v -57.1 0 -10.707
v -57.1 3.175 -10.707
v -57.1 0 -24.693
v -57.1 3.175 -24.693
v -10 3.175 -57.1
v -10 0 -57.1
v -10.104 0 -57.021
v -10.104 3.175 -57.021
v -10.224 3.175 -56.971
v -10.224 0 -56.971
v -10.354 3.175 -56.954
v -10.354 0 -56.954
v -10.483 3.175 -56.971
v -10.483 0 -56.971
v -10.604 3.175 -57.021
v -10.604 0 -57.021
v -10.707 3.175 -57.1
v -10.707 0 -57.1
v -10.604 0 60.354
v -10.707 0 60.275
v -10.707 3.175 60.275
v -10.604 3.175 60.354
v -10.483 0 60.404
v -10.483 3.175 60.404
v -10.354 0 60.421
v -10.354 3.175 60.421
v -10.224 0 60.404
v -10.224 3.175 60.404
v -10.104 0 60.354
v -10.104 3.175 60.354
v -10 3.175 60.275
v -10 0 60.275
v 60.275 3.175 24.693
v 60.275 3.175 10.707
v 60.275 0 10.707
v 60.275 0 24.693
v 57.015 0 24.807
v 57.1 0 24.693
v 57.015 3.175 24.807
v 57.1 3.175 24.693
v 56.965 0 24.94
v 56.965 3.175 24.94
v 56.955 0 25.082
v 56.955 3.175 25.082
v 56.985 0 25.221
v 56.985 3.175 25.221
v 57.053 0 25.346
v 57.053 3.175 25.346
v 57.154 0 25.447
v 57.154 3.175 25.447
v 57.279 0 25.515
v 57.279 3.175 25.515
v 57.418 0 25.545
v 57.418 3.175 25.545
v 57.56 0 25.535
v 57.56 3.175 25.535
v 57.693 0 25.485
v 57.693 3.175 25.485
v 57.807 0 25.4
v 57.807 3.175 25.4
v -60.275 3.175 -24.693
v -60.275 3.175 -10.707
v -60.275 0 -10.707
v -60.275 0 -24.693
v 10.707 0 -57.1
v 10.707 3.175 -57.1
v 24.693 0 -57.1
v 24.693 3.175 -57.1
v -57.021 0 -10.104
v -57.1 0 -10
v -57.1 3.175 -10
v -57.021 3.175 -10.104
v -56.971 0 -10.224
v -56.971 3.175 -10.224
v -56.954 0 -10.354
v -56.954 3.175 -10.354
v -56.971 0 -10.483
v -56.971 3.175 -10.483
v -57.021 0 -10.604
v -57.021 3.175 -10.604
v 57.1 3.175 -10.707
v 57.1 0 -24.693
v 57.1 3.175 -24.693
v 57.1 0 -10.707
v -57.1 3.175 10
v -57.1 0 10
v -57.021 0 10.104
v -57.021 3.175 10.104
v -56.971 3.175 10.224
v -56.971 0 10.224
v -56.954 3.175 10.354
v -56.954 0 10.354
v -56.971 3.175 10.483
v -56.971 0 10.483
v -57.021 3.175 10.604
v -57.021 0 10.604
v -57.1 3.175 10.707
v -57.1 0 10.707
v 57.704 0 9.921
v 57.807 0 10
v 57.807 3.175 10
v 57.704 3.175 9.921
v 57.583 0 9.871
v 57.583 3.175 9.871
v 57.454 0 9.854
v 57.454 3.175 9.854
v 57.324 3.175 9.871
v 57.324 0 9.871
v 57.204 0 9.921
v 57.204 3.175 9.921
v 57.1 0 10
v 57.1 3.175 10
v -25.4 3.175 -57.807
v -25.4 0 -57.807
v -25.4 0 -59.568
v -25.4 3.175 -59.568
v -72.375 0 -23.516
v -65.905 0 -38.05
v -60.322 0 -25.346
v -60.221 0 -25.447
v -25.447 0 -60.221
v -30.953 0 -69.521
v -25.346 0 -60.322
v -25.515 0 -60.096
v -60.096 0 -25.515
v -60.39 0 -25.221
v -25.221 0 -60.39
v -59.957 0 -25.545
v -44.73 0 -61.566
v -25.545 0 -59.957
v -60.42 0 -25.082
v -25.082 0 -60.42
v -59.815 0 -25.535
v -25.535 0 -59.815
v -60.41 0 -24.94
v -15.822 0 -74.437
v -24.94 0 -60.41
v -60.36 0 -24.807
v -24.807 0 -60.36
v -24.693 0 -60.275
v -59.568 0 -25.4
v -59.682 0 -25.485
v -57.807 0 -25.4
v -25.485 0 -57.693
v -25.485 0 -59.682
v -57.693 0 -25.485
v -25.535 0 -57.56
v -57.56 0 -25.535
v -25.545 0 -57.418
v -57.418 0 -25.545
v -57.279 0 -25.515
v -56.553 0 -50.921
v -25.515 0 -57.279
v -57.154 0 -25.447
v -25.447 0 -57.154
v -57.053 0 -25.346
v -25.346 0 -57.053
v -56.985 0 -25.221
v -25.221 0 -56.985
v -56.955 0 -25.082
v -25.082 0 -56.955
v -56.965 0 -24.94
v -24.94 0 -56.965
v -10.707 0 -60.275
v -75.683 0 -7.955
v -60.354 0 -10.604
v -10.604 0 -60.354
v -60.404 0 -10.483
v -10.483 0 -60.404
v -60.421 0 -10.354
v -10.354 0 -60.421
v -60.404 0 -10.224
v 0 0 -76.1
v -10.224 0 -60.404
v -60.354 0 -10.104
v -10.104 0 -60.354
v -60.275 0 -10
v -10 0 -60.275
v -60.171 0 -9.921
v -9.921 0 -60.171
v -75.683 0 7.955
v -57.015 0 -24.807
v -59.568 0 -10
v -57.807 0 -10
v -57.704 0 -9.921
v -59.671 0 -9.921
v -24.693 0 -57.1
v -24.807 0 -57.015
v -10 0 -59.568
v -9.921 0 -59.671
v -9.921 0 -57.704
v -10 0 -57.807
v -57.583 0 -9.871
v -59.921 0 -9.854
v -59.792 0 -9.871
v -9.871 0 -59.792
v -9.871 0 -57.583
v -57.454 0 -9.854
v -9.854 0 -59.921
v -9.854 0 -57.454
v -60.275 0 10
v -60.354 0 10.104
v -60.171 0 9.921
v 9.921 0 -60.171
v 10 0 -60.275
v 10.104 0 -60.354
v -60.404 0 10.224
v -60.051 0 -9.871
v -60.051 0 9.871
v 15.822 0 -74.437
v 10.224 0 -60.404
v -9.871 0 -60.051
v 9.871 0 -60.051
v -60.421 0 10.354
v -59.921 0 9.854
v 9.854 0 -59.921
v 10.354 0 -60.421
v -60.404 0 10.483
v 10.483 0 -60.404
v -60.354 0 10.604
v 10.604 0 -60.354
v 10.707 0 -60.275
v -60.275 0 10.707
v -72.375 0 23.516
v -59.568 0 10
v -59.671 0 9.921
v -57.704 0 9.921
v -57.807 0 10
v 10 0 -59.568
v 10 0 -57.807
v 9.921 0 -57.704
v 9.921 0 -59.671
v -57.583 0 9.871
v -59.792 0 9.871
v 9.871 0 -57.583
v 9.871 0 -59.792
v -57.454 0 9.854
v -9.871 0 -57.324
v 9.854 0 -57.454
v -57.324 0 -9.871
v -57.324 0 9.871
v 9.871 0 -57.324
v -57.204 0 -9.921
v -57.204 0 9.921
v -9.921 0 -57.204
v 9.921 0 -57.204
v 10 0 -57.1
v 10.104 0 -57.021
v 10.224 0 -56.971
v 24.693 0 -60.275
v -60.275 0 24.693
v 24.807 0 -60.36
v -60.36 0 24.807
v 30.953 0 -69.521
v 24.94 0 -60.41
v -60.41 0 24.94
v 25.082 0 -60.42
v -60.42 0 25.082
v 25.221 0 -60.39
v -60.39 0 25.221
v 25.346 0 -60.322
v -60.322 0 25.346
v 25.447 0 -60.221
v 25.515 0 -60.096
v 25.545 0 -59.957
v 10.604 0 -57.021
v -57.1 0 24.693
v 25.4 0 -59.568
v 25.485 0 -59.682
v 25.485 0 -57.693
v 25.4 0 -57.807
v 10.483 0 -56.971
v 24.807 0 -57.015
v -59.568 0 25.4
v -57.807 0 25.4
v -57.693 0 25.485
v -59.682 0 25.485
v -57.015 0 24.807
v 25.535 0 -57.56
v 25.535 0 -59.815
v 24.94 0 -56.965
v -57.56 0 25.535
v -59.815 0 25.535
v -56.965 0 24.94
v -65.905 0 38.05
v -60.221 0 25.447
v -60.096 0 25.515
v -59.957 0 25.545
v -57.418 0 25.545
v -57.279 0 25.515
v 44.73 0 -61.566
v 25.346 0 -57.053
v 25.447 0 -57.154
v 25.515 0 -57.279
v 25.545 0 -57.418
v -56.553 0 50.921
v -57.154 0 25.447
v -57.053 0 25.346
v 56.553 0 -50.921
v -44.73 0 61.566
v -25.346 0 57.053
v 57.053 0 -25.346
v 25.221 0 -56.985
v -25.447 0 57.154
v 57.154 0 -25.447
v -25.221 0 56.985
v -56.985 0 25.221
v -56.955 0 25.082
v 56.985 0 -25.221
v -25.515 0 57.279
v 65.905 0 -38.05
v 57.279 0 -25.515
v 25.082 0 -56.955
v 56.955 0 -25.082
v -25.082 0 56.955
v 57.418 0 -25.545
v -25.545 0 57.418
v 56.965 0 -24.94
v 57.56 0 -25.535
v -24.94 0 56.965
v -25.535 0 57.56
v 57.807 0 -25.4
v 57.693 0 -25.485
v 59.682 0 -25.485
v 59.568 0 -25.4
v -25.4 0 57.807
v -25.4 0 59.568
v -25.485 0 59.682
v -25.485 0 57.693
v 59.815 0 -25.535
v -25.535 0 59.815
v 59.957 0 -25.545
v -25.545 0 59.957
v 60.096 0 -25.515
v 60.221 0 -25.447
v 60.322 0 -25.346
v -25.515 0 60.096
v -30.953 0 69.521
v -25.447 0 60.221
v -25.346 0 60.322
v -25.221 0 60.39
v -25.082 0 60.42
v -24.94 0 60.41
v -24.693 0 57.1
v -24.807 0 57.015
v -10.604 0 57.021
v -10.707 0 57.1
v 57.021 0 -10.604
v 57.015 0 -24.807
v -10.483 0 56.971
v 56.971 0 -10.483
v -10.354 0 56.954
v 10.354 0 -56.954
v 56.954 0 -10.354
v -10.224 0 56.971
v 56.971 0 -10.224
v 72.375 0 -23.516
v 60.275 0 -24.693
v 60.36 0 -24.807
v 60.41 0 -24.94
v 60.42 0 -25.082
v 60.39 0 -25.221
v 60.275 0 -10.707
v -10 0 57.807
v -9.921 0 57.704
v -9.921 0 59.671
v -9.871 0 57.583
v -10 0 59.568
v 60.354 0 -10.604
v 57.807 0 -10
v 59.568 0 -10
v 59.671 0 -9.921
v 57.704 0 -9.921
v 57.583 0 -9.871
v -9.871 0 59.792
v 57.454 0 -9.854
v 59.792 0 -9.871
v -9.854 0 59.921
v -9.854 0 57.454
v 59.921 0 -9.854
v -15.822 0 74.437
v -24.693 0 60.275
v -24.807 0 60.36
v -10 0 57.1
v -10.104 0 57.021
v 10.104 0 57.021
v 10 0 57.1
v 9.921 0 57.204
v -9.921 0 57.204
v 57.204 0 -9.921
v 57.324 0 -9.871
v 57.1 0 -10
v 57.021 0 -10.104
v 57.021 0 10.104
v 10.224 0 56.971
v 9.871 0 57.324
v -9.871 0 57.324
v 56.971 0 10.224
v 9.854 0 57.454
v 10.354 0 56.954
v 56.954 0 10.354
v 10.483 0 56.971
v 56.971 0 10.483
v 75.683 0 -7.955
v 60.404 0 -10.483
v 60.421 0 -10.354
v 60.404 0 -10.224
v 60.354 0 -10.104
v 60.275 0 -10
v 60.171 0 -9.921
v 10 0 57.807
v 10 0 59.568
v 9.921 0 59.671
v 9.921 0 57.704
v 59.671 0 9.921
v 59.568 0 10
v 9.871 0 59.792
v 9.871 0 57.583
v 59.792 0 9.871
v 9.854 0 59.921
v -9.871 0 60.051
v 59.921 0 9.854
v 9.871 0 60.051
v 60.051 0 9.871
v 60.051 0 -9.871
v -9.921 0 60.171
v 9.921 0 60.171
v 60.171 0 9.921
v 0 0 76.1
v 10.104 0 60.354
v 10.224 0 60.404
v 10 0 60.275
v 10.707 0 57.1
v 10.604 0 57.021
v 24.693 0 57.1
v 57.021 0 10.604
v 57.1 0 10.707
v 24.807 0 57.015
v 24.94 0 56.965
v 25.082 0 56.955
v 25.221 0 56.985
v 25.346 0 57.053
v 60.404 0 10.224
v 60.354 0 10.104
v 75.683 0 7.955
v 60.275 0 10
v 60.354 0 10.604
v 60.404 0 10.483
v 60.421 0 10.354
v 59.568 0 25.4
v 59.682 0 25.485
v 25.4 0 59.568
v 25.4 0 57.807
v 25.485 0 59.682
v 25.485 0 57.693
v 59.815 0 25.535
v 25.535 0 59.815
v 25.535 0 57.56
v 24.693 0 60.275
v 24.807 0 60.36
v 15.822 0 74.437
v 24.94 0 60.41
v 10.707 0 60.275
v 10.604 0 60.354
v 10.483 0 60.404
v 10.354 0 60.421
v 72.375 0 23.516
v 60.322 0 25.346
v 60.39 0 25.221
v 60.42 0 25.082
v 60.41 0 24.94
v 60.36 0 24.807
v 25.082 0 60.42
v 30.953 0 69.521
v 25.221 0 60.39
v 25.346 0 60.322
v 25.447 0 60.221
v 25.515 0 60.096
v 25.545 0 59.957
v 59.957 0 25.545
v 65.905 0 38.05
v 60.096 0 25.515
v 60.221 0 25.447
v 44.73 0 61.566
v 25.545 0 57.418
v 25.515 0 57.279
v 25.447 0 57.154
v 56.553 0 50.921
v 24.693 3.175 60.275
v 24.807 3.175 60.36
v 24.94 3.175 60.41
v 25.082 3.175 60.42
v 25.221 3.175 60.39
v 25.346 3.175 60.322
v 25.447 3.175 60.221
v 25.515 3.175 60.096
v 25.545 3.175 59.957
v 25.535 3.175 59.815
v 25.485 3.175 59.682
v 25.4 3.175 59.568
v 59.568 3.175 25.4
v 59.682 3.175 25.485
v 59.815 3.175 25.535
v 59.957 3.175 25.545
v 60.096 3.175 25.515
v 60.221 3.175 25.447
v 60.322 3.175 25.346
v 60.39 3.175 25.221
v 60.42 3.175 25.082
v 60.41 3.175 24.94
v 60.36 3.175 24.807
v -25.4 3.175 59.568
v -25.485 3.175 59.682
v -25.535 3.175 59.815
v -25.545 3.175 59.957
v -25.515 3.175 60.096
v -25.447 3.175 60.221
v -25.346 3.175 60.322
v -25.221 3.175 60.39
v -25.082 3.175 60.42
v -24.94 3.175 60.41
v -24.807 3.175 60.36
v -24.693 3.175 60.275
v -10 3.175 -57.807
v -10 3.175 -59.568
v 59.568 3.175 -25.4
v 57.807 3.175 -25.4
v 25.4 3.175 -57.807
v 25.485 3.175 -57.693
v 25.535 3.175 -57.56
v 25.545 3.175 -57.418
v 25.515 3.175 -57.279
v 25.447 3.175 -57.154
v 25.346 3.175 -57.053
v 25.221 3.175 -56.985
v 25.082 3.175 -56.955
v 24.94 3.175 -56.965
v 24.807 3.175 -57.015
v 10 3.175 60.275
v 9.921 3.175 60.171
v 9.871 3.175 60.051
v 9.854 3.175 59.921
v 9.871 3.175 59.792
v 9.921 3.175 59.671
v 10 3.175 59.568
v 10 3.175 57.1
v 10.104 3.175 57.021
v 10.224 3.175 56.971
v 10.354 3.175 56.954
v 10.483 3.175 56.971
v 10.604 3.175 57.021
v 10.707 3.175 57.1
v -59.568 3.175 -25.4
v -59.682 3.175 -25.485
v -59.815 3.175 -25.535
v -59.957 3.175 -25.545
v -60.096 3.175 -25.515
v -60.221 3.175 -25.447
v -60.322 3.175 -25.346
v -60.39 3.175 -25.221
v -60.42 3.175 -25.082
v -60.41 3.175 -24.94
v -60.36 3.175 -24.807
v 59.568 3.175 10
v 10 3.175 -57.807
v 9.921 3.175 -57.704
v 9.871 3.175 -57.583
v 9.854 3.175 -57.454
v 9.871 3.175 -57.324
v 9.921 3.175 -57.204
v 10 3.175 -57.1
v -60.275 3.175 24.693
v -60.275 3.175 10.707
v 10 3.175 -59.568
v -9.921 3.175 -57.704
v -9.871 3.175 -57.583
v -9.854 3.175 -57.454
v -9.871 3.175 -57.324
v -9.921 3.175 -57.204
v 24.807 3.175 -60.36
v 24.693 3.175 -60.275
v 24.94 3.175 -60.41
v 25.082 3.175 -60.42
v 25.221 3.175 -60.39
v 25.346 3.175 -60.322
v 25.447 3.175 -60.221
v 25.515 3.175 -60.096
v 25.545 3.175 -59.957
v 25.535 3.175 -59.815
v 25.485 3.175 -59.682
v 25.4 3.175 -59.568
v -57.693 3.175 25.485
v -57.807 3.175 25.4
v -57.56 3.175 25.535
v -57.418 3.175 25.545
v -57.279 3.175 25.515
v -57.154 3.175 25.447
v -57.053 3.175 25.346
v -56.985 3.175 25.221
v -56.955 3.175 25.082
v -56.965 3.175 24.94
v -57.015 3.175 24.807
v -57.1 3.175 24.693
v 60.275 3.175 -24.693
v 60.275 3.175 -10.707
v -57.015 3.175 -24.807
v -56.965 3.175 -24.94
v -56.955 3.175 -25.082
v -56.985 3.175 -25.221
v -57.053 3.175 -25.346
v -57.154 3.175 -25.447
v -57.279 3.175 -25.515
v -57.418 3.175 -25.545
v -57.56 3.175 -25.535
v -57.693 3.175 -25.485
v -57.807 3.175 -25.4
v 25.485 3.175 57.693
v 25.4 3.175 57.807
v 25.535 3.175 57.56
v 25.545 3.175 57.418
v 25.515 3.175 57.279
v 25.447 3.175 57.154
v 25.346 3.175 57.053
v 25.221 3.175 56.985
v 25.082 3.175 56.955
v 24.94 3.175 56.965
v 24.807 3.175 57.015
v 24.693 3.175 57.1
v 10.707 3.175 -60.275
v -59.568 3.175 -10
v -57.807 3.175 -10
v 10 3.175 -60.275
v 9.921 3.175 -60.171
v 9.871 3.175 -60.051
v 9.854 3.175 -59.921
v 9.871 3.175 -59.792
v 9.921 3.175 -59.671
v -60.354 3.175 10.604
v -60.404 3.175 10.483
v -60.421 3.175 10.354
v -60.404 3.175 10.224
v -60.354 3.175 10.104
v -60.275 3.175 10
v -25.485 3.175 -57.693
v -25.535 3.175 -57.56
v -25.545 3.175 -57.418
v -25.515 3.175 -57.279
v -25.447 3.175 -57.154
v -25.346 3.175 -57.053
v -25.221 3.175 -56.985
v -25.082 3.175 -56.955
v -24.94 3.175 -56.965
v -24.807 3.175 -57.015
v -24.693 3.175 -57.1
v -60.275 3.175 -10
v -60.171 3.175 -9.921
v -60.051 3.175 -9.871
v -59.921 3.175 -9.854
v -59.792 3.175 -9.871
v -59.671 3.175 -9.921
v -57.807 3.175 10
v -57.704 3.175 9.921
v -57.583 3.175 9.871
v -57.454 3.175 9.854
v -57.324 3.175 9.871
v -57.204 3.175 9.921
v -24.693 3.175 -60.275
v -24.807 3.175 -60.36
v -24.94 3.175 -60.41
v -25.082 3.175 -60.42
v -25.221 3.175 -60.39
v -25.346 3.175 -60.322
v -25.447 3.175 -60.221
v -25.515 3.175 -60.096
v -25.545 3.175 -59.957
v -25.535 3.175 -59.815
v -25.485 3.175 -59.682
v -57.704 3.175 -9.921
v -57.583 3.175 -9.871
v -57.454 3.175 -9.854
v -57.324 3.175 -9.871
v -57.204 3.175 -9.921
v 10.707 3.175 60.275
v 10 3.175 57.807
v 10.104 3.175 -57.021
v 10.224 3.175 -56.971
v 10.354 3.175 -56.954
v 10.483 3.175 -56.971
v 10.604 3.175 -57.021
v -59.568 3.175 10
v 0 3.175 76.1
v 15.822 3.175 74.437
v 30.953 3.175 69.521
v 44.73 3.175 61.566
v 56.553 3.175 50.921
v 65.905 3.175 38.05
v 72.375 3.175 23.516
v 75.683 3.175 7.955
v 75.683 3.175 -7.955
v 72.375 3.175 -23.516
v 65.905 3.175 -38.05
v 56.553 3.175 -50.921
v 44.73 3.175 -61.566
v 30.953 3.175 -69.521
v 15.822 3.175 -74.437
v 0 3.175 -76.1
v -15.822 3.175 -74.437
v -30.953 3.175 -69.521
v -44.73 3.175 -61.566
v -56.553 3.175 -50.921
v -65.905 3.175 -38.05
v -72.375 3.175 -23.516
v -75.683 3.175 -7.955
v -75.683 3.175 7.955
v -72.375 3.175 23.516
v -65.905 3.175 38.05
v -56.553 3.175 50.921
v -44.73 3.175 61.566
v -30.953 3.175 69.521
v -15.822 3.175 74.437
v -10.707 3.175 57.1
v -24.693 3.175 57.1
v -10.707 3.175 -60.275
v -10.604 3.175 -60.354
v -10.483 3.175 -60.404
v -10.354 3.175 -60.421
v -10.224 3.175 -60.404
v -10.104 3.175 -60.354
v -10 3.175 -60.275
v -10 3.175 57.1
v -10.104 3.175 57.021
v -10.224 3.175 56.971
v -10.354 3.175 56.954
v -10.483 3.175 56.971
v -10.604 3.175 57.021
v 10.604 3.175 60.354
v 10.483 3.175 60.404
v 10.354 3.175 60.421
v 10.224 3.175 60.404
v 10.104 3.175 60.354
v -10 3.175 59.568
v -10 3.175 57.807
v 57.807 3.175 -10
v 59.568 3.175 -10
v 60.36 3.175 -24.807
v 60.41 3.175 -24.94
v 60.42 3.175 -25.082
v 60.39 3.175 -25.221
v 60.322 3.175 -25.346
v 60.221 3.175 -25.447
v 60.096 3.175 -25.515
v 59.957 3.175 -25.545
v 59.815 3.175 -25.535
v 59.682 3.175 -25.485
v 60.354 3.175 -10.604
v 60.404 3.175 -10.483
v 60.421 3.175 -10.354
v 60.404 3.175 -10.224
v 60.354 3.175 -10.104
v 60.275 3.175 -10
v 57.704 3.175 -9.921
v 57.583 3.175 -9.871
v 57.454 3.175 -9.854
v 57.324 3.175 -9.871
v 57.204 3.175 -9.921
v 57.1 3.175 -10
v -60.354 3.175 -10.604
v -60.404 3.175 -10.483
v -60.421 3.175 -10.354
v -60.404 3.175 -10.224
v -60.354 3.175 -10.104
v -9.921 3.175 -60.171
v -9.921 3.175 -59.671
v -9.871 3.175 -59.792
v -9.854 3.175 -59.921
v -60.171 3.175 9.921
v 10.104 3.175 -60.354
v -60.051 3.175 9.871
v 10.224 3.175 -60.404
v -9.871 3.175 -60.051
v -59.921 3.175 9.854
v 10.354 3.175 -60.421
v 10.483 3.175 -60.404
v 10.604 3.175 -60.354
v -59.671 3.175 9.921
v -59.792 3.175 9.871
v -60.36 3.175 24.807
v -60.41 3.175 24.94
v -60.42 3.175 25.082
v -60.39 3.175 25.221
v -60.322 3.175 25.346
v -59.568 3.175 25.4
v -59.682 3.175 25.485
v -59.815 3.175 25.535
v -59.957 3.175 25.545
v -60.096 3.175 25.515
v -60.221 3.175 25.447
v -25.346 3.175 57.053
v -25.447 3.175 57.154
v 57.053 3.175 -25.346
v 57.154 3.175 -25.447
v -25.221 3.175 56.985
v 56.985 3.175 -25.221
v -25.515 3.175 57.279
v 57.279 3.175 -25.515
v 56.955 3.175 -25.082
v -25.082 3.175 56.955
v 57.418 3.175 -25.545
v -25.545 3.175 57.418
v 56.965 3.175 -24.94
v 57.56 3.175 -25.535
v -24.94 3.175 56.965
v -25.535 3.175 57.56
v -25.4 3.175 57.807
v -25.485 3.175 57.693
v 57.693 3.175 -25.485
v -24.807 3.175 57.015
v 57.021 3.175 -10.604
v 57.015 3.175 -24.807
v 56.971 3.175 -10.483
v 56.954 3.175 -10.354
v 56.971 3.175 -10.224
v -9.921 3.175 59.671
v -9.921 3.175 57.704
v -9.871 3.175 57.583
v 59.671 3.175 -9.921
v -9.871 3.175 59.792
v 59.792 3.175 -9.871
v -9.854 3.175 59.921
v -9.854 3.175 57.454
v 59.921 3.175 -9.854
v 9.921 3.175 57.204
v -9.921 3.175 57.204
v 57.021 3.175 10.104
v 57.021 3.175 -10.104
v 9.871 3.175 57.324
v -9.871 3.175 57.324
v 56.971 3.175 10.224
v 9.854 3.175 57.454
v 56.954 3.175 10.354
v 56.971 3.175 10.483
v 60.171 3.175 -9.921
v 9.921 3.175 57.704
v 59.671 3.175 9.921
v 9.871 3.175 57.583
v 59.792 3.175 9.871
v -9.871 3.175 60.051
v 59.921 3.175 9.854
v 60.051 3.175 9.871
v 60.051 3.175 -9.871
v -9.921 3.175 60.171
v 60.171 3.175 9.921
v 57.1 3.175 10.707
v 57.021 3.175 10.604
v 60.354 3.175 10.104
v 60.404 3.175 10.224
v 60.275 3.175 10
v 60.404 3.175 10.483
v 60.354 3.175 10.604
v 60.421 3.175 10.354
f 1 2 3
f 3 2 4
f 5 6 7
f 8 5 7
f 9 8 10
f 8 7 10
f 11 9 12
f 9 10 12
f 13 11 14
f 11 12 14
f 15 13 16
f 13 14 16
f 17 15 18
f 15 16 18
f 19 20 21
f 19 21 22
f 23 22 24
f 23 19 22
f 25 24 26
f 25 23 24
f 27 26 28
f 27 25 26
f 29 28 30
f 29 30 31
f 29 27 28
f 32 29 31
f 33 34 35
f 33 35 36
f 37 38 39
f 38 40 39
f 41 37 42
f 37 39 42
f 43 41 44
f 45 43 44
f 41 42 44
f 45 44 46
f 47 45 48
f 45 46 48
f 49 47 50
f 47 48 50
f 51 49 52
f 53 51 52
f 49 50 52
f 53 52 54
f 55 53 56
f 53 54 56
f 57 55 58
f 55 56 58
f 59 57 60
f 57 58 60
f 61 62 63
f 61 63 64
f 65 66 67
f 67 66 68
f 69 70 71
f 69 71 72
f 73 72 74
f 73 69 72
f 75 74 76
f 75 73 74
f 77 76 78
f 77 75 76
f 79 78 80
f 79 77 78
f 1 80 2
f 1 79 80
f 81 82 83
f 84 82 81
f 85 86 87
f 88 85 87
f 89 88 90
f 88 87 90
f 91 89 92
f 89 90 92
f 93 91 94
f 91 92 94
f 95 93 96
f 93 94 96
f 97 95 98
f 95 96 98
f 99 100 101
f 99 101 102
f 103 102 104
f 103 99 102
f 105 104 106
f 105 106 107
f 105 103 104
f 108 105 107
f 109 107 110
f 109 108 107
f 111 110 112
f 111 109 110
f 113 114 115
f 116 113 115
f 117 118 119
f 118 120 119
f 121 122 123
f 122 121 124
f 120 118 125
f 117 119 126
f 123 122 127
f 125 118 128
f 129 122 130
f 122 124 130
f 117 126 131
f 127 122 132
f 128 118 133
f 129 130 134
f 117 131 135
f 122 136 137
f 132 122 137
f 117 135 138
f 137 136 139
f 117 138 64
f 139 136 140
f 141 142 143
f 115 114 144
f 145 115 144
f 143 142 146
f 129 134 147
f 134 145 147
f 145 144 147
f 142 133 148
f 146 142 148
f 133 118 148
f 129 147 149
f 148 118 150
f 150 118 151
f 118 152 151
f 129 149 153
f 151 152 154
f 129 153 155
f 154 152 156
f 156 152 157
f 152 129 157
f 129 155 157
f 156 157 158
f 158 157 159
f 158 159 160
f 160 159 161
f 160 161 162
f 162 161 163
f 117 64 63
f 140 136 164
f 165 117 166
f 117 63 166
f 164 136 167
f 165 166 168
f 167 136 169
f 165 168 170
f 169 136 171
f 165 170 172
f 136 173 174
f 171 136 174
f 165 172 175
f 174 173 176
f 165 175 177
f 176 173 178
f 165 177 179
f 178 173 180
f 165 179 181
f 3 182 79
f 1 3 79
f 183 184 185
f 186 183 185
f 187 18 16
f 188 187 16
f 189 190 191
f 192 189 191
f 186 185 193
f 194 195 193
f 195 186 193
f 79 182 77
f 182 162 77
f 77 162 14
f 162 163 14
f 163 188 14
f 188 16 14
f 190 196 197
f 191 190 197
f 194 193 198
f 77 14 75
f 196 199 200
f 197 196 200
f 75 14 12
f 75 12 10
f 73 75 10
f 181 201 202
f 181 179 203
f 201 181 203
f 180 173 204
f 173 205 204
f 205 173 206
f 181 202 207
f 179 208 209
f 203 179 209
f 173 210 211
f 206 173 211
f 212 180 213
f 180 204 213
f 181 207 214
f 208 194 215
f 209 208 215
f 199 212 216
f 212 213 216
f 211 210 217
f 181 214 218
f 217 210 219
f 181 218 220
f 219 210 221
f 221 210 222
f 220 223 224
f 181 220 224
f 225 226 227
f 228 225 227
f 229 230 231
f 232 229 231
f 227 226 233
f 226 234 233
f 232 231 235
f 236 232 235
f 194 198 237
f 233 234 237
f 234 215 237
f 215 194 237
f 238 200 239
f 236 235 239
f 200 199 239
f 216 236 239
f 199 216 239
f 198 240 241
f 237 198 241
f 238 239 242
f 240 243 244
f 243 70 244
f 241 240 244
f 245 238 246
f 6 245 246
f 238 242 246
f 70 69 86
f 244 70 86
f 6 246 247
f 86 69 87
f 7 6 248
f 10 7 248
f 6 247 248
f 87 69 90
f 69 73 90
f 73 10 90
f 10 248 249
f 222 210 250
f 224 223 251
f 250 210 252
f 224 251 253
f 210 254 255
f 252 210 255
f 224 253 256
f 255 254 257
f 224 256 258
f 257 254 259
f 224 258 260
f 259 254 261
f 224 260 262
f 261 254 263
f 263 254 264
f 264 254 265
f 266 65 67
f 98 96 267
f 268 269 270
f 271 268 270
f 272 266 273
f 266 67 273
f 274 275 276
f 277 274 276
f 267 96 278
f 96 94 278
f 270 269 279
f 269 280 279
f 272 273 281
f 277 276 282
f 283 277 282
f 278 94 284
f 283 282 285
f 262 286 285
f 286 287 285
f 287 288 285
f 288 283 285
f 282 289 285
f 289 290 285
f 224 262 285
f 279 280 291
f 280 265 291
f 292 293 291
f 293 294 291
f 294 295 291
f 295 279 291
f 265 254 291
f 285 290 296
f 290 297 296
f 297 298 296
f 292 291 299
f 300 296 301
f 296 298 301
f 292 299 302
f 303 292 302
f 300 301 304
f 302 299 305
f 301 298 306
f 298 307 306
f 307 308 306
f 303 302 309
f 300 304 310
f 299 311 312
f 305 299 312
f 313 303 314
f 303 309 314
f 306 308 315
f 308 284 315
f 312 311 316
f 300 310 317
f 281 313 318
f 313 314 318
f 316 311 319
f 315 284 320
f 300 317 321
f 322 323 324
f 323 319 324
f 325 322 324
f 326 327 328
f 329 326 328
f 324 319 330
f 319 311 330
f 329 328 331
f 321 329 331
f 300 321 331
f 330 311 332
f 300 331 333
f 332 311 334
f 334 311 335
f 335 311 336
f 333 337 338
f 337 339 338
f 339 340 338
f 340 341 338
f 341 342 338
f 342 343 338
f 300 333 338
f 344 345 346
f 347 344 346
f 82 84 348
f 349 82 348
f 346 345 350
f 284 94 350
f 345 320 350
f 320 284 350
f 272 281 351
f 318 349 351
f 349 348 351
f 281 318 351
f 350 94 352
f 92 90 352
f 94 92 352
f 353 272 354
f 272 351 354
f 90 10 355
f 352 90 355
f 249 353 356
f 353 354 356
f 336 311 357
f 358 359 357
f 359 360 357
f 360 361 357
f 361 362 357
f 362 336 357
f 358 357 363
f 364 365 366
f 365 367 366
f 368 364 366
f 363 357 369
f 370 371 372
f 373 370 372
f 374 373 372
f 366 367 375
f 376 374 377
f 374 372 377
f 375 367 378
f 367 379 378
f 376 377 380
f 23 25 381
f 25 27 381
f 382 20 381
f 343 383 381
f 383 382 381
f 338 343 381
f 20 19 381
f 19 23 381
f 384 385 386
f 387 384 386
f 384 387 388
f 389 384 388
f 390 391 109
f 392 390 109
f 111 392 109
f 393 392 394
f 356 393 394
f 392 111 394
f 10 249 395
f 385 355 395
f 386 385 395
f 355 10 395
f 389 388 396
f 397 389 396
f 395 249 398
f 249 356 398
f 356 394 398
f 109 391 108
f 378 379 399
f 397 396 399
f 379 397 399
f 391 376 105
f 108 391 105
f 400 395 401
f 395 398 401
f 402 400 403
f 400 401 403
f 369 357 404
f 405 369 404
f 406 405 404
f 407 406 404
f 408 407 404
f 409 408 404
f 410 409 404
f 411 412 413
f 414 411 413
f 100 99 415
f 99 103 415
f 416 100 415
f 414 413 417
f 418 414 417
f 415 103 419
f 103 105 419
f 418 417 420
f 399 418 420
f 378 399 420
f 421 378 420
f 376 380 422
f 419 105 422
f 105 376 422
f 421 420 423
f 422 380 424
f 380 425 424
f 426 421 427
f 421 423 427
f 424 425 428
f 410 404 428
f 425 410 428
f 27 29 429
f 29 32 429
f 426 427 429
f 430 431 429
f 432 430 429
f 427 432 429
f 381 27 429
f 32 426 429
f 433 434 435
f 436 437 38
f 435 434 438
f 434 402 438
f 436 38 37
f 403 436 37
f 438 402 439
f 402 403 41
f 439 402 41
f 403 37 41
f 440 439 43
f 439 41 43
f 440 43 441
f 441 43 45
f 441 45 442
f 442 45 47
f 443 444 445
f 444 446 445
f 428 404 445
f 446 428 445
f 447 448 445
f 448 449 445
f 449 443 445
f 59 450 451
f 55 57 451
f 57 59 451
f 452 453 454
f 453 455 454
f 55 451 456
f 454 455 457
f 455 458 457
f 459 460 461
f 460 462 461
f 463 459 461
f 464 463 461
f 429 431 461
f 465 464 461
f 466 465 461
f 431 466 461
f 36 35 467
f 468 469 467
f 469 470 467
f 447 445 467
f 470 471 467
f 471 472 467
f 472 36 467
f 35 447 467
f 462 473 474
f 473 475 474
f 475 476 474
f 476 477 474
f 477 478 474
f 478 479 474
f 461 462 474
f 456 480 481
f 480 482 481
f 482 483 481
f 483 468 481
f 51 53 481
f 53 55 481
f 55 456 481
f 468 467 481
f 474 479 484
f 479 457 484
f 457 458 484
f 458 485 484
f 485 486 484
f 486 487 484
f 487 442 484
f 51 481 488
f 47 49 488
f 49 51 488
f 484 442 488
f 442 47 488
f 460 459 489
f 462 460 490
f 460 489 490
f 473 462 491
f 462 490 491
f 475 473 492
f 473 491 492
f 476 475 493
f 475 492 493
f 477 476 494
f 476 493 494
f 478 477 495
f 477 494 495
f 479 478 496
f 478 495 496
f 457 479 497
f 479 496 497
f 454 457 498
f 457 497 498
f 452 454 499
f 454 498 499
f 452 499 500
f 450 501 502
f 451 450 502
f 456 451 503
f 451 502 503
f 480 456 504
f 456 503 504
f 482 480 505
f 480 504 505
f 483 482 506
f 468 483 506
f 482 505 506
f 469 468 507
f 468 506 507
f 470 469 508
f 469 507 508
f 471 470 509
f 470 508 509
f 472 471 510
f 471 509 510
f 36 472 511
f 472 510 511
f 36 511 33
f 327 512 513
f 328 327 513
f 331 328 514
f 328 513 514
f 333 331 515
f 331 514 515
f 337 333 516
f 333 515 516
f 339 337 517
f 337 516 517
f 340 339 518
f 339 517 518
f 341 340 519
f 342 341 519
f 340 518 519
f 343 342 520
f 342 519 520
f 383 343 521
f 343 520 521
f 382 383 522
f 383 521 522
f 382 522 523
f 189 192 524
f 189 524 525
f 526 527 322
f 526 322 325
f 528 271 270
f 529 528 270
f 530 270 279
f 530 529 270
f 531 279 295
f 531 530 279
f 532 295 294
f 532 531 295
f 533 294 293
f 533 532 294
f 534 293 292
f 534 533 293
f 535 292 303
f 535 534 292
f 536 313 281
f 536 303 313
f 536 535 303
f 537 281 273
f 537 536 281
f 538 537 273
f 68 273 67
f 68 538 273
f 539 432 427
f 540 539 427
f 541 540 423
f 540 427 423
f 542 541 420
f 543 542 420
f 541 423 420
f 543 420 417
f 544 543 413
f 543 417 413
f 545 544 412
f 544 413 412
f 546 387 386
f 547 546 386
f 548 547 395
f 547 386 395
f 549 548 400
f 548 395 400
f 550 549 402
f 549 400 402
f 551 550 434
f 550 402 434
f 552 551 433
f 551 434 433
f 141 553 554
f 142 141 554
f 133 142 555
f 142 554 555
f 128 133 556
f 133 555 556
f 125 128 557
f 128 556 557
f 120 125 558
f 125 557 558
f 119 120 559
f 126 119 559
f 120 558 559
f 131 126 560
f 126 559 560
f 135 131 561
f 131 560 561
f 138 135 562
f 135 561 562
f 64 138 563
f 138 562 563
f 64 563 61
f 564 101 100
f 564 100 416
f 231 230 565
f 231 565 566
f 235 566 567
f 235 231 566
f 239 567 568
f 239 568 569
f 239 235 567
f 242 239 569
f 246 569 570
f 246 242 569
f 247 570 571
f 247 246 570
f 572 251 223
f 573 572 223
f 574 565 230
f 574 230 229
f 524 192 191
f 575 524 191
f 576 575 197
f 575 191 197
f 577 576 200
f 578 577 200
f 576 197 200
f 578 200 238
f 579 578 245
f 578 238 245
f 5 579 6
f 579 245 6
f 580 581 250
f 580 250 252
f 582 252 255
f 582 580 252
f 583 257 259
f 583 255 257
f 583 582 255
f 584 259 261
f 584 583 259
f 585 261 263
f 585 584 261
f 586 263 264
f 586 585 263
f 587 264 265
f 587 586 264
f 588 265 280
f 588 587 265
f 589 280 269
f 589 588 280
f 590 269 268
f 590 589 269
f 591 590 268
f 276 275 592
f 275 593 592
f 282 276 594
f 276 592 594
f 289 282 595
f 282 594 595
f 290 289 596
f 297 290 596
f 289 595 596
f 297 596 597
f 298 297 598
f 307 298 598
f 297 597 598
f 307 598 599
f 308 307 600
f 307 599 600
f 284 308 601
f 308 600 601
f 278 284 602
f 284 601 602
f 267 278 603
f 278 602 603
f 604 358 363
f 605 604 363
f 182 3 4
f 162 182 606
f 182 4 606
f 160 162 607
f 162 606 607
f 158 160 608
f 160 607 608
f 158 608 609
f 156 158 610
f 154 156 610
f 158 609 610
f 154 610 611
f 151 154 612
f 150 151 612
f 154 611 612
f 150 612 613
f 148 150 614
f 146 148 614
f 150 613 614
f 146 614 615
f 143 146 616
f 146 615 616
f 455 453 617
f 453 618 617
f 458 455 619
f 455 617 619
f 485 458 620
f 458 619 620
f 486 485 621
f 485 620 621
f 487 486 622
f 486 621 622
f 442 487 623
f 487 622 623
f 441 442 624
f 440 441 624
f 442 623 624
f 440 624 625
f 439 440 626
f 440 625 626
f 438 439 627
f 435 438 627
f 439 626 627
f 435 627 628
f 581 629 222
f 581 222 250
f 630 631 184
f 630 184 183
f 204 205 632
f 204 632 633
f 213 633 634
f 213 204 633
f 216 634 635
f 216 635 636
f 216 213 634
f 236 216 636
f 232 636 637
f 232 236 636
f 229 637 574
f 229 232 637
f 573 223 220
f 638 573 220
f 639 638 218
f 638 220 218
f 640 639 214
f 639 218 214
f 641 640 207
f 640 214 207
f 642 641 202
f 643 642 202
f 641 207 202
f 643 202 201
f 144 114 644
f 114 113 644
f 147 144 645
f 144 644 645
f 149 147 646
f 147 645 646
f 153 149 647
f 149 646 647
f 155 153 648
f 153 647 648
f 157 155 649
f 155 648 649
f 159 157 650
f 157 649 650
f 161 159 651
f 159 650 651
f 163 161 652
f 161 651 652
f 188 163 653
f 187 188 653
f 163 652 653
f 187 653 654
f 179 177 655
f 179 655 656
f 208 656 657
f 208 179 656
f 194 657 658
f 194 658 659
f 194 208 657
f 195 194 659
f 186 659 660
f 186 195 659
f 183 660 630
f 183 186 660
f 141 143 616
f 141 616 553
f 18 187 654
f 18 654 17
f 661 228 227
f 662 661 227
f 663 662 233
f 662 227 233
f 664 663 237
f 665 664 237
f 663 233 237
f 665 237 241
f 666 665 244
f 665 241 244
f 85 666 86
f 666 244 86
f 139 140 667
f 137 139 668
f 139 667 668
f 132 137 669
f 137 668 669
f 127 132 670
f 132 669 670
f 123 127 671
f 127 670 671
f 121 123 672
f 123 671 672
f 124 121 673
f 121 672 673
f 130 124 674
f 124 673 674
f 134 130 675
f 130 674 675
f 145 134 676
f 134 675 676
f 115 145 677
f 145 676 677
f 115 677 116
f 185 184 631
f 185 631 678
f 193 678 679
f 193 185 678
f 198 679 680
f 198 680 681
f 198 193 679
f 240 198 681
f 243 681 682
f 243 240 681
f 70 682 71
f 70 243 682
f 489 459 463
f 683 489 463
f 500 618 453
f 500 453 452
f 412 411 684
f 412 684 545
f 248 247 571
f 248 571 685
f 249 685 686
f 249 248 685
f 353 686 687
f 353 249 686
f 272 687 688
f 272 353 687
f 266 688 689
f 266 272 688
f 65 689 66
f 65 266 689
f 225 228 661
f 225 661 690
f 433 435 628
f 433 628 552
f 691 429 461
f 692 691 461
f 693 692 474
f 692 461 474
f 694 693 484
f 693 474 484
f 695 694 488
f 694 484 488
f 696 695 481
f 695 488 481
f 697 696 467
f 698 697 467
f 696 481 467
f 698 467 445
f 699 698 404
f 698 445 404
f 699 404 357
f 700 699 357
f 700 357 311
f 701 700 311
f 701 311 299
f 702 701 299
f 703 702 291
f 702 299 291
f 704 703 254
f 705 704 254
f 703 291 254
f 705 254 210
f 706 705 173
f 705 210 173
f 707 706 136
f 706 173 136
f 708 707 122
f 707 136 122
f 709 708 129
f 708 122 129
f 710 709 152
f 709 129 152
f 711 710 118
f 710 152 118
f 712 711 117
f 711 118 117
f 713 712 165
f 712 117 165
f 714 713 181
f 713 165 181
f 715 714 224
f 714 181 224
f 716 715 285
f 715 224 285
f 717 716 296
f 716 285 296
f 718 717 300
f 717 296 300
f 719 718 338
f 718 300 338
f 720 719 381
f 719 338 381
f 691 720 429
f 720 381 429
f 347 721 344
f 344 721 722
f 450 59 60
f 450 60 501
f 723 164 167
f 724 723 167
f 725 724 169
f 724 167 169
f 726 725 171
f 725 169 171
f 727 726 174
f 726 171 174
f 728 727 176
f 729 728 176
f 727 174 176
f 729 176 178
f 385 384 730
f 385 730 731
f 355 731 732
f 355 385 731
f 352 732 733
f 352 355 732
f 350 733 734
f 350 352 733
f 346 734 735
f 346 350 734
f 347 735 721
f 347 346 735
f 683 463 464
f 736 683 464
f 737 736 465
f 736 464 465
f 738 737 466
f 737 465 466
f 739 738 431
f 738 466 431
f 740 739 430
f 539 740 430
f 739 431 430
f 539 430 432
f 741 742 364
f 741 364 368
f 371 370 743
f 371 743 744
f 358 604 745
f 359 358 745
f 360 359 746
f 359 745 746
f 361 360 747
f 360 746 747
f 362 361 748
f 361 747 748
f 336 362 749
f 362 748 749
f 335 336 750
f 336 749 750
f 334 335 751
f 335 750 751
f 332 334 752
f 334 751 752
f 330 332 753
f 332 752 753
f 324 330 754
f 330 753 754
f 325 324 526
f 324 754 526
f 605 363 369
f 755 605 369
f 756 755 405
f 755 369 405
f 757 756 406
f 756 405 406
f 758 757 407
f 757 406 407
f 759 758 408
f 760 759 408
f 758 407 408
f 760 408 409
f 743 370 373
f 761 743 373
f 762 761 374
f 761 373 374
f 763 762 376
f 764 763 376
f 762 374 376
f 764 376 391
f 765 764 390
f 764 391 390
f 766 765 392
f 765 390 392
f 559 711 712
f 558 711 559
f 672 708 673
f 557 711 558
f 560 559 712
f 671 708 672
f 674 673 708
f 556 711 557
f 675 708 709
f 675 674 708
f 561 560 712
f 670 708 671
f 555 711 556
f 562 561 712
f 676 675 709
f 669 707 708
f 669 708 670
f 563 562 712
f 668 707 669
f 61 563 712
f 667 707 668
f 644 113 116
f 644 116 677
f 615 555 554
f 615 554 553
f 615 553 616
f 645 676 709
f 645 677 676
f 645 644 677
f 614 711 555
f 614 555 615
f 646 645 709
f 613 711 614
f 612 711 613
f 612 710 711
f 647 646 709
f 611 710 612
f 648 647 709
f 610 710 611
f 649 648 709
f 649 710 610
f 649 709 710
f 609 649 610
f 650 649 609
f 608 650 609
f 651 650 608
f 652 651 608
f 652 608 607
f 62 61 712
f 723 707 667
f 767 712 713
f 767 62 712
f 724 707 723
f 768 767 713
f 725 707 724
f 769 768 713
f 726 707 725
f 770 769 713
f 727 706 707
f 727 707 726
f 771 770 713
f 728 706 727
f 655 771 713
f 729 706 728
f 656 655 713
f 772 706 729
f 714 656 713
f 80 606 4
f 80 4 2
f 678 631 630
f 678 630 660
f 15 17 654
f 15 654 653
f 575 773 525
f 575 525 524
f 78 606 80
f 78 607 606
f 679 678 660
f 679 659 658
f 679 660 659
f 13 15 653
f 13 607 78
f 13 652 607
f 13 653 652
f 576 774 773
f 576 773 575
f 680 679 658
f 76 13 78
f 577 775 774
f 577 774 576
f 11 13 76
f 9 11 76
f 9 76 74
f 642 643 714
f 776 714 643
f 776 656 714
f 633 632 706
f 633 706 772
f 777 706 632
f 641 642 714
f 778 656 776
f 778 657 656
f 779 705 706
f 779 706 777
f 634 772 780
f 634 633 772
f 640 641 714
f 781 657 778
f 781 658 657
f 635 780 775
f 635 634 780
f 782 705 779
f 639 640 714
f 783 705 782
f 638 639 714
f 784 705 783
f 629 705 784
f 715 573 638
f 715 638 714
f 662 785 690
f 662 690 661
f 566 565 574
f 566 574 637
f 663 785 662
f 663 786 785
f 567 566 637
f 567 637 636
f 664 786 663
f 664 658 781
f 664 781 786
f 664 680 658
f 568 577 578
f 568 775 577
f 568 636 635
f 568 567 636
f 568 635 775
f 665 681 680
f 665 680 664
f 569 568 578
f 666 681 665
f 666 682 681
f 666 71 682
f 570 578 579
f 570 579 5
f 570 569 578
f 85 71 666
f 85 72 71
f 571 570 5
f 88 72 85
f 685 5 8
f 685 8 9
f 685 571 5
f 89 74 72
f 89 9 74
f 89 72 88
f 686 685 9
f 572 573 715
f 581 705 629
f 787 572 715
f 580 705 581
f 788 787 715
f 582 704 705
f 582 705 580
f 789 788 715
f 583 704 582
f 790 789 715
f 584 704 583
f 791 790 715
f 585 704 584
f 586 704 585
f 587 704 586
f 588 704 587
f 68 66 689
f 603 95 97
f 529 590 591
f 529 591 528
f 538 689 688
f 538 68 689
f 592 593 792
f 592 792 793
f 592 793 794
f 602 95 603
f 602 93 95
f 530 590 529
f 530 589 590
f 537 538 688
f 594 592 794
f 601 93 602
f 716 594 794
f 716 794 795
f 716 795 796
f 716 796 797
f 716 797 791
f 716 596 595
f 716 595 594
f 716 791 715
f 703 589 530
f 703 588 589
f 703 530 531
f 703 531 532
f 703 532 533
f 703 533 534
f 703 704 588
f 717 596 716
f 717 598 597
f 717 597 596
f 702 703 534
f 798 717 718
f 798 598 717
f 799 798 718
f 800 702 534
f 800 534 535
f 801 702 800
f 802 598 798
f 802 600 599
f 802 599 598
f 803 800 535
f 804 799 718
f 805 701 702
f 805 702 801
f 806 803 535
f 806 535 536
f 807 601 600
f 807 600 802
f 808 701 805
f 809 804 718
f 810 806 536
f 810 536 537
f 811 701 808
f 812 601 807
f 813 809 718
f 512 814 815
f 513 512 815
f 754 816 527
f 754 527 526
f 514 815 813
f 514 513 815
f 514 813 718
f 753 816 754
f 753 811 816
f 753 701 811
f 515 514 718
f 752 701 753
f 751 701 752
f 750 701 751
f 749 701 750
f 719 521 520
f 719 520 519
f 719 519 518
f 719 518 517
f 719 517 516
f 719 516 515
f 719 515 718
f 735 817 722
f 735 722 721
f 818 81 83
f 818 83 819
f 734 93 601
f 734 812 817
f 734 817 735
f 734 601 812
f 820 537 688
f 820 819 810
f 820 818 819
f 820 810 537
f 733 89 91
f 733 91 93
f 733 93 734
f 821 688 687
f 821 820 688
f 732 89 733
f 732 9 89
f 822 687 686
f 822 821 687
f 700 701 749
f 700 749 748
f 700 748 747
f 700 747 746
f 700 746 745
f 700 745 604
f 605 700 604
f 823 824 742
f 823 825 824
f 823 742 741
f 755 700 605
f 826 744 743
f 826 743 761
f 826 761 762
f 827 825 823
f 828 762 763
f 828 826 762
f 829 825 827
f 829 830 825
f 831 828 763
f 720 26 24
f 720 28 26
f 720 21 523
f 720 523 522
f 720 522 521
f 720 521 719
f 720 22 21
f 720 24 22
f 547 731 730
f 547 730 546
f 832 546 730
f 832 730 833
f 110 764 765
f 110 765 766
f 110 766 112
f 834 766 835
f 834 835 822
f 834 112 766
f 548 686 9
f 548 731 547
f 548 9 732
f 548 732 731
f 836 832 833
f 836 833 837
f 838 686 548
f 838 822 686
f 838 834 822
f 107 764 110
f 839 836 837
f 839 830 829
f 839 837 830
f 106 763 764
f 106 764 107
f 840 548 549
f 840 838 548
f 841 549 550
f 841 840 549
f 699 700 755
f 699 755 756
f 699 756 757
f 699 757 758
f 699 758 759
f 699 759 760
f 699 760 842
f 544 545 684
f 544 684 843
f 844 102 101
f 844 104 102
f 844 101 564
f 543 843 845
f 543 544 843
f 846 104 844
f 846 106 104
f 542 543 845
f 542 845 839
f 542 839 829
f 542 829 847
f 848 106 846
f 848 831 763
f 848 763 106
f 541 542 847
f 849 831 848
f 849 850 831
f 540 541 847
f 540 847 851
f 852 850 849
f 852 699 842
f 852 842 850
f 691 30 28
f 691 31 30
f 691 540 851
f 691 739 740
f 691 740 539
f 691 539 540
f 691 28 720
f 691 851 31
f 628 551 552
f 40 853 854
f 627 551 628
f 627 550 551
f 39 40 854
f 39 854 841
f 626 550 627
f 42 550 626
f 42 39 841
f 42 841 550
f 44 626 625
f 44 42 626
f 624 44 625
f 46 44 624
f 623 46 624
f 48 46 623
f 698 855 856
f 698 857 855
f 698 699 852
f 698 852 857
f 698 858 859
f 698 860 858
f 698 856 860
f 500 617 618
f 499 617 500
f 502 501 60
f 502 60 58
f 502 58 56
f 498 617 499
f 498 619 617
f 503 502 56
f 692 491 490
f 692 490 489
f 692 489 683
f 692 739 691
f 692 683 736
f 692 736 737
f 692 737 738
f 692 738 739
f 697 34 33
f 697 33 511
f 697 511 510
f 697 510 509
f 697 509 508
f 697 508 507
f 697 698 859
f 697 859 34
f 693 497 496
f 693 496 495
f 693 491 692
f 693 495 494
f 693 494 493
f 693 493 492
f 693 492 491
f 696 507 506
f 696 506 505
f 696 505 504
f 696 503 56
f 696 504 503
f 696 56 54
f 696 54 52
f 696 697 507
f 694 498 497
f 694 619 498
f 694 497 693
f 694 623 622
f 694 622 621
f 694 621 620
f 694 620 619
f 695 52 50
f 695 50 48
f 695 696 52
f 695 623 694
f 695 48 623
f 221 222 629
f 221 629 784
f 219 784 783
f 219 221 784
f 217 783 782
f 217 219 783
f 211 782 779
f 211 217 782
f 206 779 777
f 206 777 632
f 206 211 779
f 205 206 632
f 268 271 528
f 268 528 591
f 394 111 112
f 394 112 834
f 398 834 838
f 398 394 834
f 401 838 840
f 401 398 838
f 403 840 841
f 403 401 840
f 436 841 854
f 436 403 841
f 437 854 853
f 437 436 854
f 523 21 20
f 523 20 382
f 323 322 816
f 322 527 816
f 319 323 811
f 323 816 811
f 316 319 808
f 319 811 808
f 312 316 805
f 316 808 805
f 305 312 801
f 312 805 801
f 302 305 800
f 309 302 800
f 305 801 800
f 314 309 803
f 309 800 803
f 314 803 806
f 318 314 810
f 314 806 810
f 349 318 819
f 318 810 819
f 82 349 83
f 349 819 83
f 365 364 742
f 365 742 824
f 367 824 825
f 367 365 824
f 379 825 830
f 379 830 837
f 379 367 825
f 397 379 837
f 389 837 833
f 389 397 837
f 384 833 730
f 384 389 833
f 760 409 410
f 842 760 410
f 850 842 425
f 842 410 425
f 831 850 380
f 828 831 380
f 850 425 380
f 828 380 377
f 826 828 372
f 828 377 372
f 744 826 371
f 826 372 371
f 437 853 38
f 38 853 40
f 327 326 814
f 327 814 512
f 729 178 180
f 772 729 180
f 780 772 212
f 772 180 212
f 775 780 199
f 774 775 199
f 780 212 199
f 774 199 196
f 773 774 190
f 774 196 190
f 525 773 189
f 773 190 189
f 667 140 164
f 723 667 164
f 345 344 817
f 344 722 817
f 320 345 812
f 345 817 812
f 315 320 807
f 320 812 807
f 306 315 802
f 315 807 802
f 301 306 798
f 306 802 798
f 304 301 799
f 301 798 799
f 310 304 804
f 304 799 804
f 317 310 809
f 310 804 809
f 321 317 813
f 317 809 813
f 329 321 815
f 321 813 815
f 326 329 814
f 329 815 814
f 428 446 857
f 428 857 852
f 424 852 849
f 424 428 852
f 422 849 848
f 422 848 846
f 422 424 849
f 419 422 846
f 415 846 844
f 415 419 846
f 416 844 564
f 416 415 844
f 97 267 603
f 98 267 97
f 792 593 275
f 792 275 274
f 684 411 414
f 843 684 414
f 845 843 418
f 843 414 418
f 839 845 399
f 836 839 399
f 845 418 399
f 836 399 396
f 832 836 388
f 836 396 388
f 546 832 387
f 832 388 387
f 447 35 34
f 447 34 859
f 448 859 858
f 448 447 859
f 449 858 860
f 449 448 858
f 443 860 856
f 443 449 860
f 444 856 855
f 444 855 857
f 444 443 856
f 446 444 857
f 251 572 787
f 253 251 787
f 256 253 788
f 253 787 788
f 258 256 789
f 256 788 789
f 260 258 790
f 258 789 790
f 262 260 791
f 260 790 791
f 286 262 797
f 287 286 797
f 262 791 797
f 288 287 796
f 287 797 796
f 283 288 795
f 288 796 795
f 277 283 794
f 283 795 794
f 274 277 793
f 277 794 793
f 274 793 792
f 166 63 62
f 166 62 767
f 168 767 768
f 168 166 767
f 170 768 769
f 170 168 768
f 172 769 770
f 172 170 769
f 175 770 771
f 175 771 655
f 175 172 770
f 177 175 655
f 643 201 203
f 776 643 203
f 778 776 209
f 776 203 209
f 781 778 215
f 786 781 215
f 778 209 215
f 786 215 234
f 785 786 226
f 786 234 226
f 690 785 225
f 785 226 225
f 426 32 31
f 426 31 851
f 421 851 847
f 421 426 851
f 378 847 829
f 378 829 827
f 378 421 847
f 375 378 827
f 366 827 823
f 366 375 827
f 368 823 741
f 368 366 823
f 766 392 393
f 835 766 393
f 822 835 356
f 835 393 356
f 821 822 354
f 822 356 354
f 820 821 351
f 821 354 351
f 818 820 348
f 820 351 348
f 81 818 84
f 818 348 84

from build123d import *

# Parameters (mm, degrees)
SKETCH1_R                   = 76.1
BOSS_EXTRUDE1_DEPTH         = 3.175
SKETCH3_W                   = 15.4
SKETCH3_H                   = 3.175
CUT_EXTRUDE1_DEPTH          = 108.66847554
SKETCH4_R                   = 0.5
CUT_EXTRUDE2_DEPTH          = 108.66847554
SKETCH_PATTERN1_DEPTH       = 3.175
CIRPATTERN1_COUNT           = 4
CIRPATTERN1_COPY_1_SKETCH_R = 0.5
CIRPATTERN1_COPY_1_DEPTH    = 108.66847554
CIRPATTERN1_COPY_2_SKETCH_R = 0.5
CIRPATTERN1_COPY_2_DEPTH    = 108.66847554
CIRPATTERN1_COPY_3_SKETCH_R = 0.5
CIRPATTERN1_COPY_3_DEPTH    = 108.66847554
CIRPATTERN1_COPY_4_DEPTH    = 3.175
CIRPATTERN1_COPY_5_DEPTH    = 3.175
CIRPATTERN1_COPY_6_DEPTH    = 3.175


# Read off the part's stored shape, not the designer's step: Sketch-Pattern1
with BuildPart() as part:
    # Sketch1 → Boss-Extrude1 (new body)
    with BuildSketch(Plane(origin=(0, 0, 0), x_dir=(1, 0, 0), z_dir=(0, 1, 0))):
        with Locations(Location((0, 0, 0), (0, 0, 270))):
            Circle(SKETCH1_R)
    extrude(amount=BOSS_EXTRUDE1_DEPTH)

    # Sketch3 → Cut-Extrude1 (cut, symmetric)
    with BuildSketch(Plane(origin=(0, 3.175, 0), x_dir=(1, 0, 0), z_dir=(0, 1, 0))):
        with Locations((-17.7, 58.6875)):
            Rectangle(SKETCH3_W, SKETCH3_H)
        with Locations((17.7, 58.6875)):
            Rectangle(SKETCH3_W, SKETCH3_H)
    cut_extrude1 = extrude(amount=CUT_EXTRUDE1_DEPTH, both=True, mode=Mode.SUBTRACT)

    # Sketch4 → Cut-Extrude2 (cut, symmetric)
    with BuildSketch(Plane(origin=(0, 3.175, 0), x_dir=(1, 0, 0), z_dir=(0, 1, 0))):
        with Locations((-25.046446609, 59.921446609)):
            Circle(SKETCH4_R)
        with Locations((-25.046446609, 57.453553391)):
            Circle(SKETCH4_R)
    cut_extrude2 = extrude(amount=CUT_EXTRUDE2_DEPTH, both=True, mode=Mode.SUBTRACT)

    # Sketch-Pattern1 outline → Sketch-Pattern1 (cut)
    with BuildSketch(Plane(origin=(0, 0, 0), x_dir=(1, 0, 0), z_dir=(0, 1, 0))):
        with BuildLine():
            Line((10, 60.275), (10.707106781, 60.275))
            ThreePointArc((10.707106781, 60.275), (10.353553391, 60.421446609), (10, 60.275))
        make_face()
        with BuildLine():
            Line((10.707106781, 57.1), (10, 57.1))
            ThreePointArc((10, 57.1), (10.353553391, 56.953553391), (10.707106781, 57.1))
        make_face()
        with BuildLine():
            Line((10, 57.1), (10, 57.807106781))
            ThreePointArc((10, 57.807106781), (9.853553391, 57.453553391), (10, 57.1))
        make_face()
        with BuildLine():
            Line((10, 59.567893219), (10, 60.275))
            ThreePointArc((10, 60.275), (9.853553391, 59.921446609), (10, 59.567893219))
        make_face()
    sketch_pattern1 = extrude(amount=SKETCH_PATTERN1_DEPTH, mode=Mode.SUBTRACT)

    # Mirror1: Cut-Extrude2, Sketch-Pattern1 across plane
    add(cut_extrude2.mirror(Plane(origin=(0, 0, 0), x_dir=(0, 0, 1), z_dir=(1, 0, 0))), mode=Mode.SUBTRACT)
    add(sketch_pattern1.mirror(Plane(origin=(0, 0, 0), x_dir=(0, 0, 1), z_dir=(1, 0, 0))), mode=Mode.SUBTRACT)

    # CirPattern1: Cut-Extrude1, Cut-Extrude2, Sketch-Pattern1 ×4 about axis
    cirpattern1_axis = Axis((0, 0, 0), (0, 1, 0))
    add([cut_extrude1.rotate(cirpattern1_axis, i * 360 / CIRPATTERN1_COUNT) for i in range(1, CIRPATTERN1_COUNT)], mode=Mode.SUBTRACT)
    add([cut_extrude2.rotate(cirpattern1_axis, i * 360 / CIRPATTERN1_COUNT) for i in range(1, CIRPATTERN1_COUNT)], mode=Mode.SUBTRACT)
    add([sketch_pattern1.rotate(cirpattern1_axis, i * 360 / CIRPATTERN1_COUNT) for i in range(1, CIRPATTERN1_COUNT)], mode=Mode.SUBTRACT)

    # CirPattern1 copy 1 sketch → CirPattern1 copy 1 (cut, symmetric)
    with BuildSketch(Plane.ZX.offset(3.175)):
        with Locations((-25.046446609, -59.921446609)):
            Circle(CIRPATTERN1_COPY_1_SKETCH_R)
        with Locations((-25.046446609, -57.453553391)):
            Circle(CIRPATTERN1_COPY_1_SKETCH_R)
    extrude(amount=CIRPATTERN1_COPY_1_DEPTH, both=True, mode=Mode.SUBTRACT)

    # CirPattern1 copy 2 sketch → CirPattern1 copy 2 (cut, symmetric)
    with BuildSketch(Plane(origin=(0, 3.175, 0), x_dir=(1, 0, 0), z_dir=(0, 1, 0))):
        with Locations((-25.046446609, -59.921446609)):
            Circle(CIRPATTERN1_COPY_2_SKETCH_R)
        with Locations((-25.046446609, -57.453553391)):
            Circle(CIRPATTERN1_COPY_2_SKETCH_R)
    extrude(amount=CIRPATTERN1_COPY_2_DEPTH, both=True, mode=Mode.SUBTRACT)

    # CirPattern1 copy 3 sketch → CirPattern1 copy 3 (cut, symmetric)
    with BuildSketch(Plane(origin=(0, 3.175, 0), x_dir=(0, 0, -1), z_dir=(0, 1, 0))):
        with Locations((-25.046446609, -59.921446609)):
            Circle(CIRPATTERN1_COPY_3_SKETCH_R)
        with Locations((-25.046446609, -57.453553391)):
            Circle(CIRPATTERN1_COPY_3_SKETCH_R)
    extrude(amount=CIRPATTERN1_COPY_3_DEPTH, both=True, mode=Mode.SUBTRACT)

    # CirPattern1 copy 4 sketch → CirPattern1 copy 4 (cut)
    with BuildSketch(Plane.ZX):
        with BuildLine():
            Line((10, -60.275), (10.707106781, -60.275))
            ThreePointArc((10.707106781, -60.275), (10.353553391, -60.421446609), (10, -60.275))
        make_face()
        with BuildLine():
            Line((10.707106781, -57.1), (10, -57.1))
            ThreePointArc((10, -57.1), (10.353553391, -56.953553391), (10.707106781, -57.1))
        make_face()
        with BuildLine():
            Line((10, -57.1), (10, -57.807106781))
            ThreePointArc((10, -57.807106781), (9.853553391, -57.453553391), (10, -57.1))
        make_face()
        with BuildLine():
            Line((10, -59.567893219), (10, -60.275))
            ThreePointArc((10, -60.275), (9.853553391, -59.921446609), (10, -59.567893219))
        make_face()
    extrude(amount=CIRPATTERN1_COPY_4_DEPTH, mode=Mode.SUBTRACT)

    # CirPattern1 copy 5 sketch → CirPattern1 copy 5 (cut)
    with BuildSketch(Plane(origin=(0, 0, 0), x_dir=(1, 0, 0), z_dir=(0, 1, 0))):
        with BuildLine():
            Line((10, -60.275), (10.707106781, -60.275))
            ThreePointArc((10.707106781, -60.275), (10.353553391, -60.421446609), (10, -60.275))
        make_face()
        with BuildLine():
            Line((10.707106781, -57.1), (10, -57.1))
            ThreePointArc((10, -57.1), (10.353553391, -56.953553391), (10.707106781, -57.1))
        make_face()
        with BuildLine():
            Line((10, -57.1), (10, -57.807106781))
            ThreePointArc((10, -57.807106781), (9.853553391, -57.453553391), (10, -57.1))
        make_face()
        with BuildLine():
            Line((10, -59.567893219), (10, -60.275))
            ThreePointArc((10, -60.275), (9.853553391, -59.921446609), (10, -59.567893219))
        make_face()
    extrude(amount=CIRPATTERN1_COPY_5_DEPTH, mode=Mode.SUBTRACT)

    # CirPattern1 copy 6 sketch → CirPattern1 copy 6 (cut)
    with BuildSketch(Plane(origin=(0, 0, 0), x_dir=(0, 0, -1), z_dir=(0, 1, 0))):
        with BuildLine():
            Line((10, -60.275), (10.707106781, -60.275))
            ThreePointArc((10.707106781, -60.275), (10.353553391, -60.421446609), (10, -60.275))
        make_face()
        with BuildLine():
            Line((10.707106781, -57.1), (10, -57.1))
            ThreePointArc((10, -57.1), (10.353553391, -56.953553391), (10.707106781, -57.1))
        make_face()
        with BuildLine():
            Line((10, -57.1), (10, -57.807106781))
            ThreePointArc((10, -57.807106781), (9.853553391, -57.453553391), (10, -57.1))
        make_face()
        with BuildLine():
            Line((10, -59.567893219), (10, -60.275))
            ThreePointArc((10, -60.275), (9.853553391, -59.921446609), (10, -59.567893219))
        make_face()
    extrude(amount=CIRPATTERN1_COPY_6_DEPTH, mode=Mode.SUBTRACT)


solid = part.part
